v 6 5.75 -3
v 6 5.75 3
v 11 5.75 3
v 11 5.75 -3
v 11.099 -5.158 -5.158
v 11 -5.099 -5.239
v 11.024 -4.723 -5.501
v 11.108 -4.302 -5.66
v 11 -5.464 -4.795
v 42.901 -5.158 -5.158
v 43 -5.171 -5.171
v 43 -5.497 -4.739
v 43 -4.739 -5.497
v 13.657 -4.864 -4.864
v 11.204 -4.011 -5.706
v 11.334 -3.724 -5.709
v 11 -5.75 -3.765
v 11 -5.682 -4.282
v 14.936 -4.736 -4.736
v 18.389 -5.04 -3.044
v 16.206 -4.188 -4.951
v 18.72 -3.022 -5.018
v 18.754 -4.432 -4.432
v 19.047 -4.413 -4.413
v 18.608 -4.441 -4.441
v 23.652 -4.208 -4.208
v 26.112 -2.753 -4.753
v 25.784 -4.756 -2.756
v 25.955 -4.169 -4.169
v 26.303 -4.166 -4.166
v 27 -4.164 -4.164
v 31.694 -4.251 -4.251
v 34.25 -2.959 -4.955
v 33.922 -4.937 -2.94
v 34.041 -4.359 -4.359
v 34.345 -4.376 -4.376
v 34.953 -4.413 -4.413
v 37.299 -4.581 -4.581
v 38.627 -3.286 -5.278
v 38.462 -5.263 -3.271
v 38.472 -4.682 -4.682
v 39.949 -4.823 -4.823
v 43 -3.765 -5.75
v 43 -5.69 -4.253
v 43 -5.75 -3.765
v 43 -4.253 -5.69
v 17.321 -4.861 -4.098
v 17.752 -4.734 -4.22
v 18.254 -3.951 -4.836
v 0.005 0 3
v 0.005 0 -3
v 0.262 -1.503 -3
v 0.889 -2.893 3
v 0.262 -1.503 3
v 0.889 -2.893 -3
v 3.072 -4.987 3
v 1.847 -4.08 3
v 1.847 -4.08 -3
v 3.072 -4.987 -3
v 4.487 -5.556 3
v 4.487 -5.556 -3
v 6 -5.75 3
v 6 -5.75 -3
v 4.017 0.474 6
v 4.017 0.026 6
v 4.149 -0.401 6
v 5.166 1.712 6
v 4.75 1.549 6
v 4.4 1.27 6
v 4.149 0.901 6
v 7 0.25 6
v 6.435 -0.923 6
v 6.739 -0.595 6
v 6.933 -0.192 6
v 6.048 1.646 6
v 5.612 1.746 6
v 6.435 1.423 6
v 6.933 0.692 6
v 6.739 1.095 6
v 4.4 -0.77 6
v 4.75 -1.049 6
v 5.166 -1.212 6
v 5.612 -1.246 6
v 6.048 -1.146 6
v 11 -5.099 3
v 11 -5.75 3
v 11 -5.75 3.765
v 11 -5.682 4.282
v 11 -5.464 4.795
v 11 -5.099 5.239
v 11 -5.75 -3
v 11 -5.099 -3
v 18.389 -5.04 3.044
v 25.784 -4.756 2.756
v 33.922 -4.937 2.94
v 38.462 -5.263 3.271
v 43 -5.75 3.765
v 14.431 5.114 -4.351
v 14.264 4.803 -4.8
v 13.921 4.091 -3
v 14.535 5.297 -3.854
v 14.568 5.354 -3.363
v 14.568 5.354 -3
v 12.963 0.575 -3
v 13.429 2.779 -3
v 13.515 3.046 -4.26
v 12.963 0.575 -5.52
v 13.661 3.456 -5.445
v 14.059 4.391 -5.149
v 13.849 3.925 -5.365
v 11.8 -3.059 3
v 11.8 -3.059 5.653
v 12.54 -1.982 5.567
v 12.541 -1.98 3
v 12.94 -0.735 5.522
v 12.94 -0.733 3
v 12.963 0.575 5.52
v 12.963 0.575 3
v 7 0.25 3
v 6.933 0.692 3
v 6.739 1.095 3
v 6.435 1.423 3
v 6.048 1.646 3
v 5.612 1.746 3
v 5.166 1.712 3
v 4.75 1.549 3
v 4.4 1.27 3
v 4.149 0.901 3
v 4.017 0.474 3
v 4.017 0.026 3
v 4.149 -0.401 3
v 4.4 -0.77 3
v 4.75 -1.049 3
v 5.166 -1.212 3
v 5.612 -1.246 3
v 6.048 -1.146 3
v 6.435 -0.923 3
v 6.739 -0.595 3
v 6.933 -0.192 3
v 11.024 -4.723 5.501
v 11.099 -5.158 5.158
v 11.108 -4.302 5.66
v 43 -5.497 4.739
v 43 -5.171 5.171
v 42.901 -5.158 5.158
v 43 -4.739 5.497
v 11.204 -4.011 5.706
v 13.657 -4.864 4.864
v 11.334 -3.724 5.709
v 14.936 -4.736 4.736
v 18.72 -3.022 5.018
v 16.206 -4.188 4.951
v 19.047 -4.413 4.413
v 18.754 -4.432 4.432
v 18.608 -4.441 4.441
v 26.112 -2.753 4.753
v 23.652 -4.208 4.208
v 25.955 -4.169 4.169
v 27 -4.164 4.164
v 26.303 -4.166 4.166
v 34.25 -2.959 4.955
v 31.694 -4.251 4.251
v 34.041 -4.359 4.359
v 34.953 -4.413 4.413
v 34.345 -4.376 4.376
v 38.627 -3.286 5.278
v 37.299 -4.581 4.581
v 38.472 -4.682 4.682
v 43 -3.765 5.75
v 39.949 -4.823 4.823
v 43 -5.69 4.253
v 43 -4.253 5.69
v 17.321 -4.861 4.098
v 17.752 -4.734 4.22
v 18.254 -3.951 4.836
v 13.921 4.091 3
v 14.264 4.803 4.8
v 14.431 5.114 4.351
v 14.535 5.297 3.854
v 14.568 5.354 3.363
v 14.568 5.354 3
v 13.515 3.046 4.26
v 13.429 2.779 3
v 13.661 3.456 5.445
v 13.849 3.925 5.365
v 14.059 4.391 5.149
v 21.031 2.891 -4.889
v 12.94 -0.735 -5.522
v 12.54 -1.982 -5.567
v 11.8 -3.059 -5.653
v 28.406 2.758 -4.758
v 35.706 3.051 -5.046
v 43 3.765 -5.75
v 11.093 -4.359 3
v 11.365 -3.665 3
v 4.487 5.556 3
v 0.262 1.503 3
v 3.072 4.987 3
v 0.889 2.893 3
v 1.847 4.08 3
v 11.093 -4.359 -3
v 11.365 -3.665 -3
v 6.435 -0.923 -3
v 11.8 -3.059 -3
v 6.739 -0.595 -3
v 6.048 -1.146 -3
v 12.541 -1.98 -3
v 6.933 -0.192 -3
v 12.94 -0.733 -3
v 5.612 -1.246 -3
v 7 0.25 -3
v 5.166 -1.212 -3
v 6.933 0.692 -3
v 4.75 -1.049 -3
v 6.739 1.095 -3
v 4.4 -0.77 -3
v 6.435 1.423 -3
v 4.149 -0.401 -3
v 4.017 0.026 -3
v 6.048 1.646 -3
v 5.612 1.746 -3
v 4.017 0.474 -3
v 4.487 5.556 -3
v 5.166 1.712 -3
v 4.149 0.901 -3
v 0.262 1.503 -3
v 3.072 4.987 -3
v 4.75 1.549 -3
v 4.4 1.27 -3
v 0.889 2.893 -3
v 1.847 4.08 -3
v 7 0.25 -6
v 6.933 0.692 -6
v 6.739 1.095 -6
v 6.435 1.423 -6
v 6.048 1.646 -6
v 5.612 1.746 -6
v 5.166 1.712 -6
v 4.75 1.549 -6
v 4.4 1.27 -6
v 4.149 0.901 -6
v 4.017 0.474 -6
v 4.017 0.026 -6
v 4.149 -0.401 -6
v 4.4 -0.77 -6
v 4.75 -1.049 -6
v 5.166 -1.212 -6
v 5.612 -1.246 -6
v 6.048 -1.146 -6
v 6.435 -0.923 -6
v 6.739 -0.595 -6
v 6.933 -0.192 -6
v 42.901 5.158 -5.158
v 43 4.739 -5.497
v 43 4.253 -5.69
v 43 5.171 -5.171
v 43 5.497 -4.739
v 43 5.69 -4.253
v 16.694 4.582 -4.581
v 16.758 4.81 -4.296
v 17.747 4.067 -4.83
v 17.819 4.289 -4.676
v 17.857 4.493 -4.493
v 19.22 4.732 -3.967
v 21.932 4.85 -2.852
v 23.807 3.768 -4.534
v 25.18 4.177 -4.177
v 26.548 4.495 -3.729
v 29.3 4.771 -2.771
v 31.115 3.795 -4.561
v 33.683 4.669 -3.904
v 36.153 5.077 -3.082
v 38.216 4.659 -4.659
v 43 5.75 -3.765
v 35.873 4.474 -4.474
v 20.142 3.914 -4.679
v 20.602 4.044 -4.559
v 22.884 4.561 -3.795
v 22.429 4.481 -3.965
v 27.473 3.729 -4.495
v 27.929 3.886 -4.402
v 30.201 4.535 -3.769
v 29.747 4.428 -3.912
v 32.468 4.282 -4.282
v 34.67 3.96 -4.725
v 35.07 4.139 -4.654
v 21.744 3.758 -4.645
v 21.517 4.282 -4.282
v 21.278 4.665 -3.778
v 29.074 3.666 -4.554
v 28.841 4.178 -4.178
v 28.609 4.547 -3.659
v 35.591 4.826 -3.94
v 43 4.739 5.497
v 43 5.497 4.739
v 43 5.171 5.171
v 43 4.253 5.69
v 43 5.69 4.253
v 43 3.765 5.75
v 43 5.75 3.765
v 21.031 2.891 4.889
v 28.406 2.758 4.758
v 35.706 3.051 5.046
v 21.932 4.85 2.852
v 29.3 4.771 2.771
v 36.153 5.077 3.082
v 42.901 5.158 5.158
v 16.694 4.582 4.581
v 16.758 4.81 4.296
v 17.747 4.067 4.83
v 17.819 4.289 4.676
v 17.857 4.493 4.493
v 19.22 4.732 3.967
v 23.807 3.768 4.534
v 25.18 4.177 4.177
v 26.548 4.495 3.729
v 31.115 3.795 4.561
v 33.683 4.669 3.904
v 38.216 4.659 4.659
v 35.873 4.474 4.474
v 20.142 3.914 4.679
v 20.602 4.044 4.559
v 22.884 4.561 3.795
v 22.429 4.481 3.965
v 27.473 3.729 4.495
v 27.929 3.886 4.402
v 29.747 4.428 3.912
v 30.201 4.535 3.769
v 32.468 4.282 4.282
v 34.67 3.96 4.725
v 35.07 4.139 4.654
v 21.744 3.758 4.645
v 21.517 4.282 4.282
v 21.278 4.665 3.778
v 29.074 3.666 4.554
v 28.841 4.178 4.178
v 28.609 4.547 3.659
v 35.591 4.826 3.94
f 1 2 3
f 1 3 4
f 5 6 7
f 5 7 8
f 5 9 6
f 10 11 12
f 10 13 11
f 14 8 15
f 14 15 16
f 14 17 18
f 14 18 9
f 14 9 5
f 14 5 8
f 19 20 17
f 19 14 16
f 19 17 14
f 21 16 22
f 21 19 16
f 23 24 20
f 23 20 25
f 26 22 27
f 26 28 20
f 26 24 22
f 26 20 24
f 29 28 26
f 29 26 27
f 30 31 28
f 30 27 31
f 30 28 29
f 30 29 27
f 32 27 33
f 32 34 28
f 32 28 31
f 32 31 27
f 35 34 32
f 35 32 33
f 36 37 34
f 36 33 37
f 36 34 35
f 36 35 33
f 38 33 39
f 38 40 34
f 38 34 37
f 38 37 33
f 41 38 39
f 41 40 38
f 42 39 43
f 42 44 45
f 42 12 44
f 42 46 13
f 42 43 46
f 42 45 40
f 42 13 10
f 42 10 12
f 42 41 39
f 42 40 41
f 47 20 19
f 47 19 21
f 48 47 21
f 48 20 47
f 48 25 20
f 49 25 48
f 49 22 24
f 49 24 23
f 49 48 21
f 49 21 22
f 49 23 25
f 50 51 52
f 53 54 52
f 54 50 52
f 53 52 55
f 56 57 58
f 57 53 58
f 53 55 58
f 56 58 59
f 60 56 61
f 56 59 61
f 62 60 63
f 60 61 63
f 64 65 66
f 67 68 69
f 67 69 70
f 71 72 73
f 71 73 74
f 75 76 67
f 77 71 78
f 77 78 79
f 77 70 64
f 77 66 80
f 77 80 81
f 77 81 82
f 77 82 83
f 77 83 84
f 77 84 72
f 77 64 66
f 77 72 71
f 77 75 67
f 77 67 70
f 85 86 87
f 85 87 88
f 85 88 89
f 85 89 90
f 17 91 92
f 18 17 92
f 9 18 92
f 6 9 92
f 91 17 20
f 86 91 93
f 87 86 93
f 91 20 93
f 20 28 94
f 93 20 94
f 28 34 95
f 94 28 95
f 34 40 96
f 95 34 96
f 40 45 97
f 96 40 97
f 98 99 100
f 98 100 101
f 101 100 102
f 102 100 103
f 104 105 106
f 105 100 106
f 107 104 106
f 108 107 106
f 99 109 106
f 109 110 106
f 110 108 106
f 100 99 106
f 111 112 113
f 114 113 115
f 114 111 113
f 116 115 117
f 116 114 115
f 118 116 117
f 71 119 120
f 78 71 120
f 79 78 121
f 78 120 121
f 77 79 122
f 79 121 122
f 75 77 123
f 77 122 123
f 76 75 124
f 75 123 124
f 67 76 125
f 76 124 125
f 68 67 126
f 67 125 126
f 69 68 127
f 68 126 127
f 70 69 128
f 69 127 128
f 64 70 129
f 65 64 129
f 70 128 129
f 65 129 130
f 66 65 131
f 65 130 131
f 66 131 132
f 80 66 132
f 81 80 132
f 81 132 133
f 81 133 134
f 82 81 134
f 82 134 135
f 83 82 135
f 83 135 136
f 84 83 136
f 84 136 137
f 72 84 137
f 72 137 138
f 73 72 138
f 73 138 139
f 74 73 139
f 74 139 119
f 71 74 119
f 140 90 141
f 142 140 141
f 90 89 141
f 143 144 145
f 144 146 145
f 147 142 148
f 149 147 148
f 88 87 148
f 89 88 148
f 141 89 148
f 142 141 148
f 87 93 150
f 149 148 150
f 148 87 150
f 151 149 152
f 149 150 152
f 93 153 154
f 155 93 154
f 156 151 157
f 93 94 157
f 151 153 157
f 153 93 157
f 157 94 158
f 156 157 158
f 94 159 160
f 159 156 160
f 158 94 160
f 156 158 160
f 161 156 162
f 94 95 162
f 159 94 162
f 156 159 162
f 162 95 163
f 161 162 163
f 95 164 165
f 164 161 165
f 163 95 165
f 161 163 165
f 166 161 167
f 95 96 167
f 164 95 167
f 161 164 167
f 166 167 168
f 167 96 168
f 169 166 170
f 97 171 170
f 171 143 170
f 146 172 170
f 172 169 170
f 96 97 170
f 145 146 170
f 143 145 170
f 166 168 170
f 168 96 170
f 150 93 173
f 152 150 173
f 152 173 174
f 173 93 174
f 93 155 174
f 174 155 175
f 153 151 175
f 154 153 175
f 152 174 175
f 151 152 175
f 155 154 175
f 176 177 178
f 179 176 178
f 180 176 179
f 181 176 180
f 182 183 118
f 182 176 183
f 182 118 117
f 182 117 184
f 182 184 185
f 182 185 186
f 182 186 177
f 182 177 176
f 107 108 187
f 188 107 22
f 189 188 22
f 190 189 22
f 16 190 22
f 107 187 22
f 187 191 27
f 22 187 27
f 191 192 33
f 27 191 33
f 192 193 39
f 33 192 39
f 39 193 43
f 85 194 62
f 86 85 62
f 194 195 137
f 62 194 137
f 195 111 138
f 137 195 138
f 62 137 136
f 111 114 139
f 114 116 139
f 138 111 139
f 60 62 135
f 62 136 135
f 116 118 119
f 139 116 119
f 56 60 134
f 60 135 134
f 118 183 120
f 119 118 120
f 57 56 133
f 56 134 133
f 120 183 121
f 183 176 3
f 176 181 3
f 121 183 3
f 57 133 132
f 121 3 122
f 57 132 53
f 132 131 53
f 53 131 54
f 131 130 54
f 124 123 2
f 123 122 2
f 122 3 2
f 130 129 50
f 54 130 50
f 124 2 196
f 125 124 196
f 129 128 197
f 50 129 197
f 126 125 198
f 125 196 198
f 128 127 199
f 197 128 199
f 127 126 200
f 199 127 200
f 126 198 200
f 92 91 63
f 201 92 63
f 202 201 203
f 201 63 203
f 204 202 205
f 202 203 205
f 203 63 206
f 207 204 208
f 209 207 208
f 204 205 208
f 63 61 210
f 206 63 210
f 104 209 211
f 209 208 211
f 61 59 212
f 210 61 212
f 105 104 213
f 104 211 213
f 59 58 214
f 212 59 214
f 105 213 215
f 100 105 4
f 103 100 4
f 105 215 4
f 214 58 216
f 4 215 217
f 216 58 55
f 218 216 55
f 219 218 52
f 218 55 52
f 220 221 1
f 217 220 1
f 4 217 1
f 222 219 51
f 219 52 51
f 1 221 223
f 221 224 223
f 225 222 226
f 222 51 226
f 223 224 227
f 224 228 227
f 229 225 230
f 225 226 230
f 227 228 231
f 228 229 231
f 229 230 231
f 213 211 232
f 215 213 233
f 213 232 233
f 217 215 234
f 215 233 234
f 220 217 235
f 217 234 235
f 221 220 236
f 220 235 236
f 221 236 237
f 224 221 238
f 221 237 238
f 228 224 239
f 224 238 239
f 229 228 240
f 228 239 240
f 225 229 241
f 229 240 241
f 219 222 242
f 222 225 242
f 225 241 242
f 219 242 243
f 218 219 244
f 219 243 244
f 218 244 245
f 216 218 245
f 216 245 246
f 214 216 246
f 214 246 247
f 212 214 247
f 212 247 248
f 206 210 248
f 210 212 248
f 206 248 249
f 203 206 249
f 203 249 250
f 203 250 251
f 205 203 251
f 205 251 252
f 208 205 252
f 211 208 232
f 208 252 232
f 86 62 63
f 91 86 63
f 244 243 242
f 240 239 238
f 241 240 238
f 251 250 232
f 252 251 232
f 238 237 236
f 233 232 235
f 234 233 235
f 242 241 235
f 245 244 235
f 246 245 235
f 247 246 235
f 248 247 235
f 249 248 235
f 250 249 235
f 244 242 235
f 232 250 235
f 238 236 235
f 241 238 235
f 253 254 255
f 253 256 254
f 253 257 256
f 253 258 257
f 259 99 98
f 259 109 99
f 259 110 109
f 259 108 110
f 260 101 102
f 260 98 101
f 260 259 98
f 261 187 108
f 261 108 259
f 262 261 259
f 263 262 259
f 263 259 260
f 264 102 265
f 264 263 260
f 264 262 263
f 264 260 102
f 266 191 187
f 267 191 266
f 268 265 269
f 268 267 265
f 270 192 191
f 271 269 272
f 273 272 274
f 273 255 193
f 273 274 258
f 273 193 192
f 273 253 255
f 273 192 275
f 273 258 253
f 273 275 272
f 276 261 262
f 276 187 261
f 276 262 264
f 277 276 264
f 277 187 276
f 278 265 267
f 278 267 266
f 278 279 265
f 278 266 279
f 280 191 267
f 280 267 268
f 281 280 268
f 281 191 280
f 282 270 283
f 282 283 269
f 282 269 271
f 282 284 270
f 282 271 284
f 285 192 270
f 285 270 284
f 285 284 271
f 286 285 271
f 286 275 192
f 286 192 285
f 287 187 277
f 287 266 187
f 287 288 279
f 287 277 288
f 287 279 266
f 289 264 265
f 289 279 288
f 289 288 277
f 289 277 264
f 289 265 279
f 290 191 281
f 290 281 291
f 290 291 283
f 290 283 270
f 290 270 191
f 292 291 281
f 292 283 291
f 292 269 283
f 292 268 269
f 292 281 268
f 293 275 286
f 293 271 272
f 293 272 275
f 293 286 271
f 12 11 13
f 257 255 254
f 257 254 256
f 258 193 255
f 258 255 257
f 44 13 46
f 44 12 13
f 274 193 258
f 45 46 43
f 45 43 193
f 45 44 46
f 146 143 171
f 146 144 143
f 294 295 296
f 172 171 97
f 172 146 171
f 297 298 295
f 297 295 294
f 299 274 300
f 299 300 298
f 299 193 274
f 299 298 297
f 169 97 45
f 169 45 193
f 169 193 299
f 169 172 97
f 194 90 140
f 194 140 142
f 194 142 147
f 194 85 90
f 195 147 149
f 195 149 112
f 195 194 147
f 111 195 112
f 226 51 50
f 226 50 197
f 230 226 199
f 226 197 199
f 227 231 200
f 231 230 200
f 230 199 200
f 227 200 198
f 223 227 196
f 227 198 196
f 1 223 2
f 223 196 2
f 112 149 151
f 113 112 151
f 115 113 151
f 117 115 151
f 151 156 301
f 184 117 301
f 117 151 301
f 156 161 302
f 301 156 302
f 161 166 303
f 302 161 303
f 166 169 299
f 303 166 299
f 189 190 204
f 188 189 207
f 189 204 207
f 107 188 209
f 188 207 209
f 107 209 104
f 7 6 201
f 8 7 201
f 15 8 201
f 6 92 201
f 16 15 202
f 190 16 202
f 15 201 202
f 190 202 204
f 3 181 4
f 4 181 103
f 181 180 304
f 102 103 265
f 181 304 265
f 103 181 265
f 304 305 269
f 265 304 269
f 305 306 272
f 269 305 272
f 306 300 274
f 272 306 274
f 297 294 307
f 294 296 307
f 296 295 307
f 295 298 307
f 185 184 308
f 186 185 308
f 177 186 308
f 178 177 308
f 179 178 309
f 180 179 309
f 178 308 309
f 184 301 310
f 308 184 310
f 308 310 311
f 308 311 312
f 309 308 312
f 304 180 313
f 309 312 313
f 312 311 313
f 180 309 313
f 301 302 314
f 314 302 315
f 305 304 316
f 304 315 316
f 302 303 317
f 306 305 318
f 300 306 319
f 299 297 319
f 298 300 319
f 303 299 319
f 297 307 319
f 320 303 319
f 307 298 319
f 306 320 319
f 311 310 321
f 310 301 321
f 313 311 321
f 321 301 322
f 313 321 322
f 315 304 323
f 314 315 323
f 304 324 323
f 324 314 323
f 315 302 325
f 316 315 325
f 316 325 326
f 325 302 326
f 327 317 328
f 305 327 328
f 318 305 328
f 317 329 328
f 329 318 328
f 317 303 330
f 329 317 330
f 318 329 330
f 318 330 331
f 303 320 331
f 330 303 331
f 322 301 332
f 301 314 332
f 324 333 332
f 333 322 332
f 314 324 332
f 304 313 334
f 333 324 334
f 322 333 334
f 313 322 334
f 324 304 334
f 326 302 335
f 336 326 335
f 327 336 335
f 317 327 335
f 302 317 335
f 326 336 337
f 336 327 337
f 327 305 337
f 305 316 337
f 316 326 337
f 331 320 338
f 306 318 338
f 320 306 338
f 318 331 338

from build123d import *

# Parameters (mm, degrees)
SKETCH1_W                = 6
SKETCH1_H                = 11.5
BOSS_EXTRUDE1_DEPTH      = 11
BOSS_EXTRUDE2_DEPTH      = 3
BOSS_EXTRUDE2_DEPTH_BACK = 9
SKETCH2_R                = 1.5
FILLET2_R                = 2
CUT_EXTRUDE4_DEPTH       = 3
FILLET8_R                = 3
CUT_EXTRUDE7_DEPTH       = 45.306461264
FILLET9_R                = 6


with BuildPart() as part:
    # Sketch1 → Boss-Extrude1 (new body)
    with BuildSketch(Plane(origin=(0, 0, 0), x_dir=(0, 0, -1), z_dir=(1, 0, 0))):
        Rectangle(SKETCH1_W, SKETCH1_H)
    extrude(amount=BOSS_EXTRUDE1_DEPTH)

    # Sketch2 → Boss-Extrude2 (add, two sides: drawn at the far end of the back side and taken through both)
    with BuildSketch(Plane.XY.offset(3).offset(-BOSS_EXTRUDE2_DEPTH_BACK)):
        with Locations((5.5, 0.25)):
            Circle(SKETCH2_R)
    extrude(amount=BOSS_EXTRUDE2_DEPTH + BOSS_EXTRUDE2_DEPTH_BACK)

    # Sketch3 → Loft1 section 0
    with BuildSketch(Plane(origin=(11, 0, 0), x_dir=(0, 0, -1), z_dir=(1, 0, 0))):
        with BuildLine():
            Line((5.75, -5.75), (-5.75, -5.75))
            Line((-5.75, -5.75), (-5.75, 5.75))
            Line((-5.75, 5.75), (5.75, 5.75))
            Line((5.75, 5.75), (5.75, -5.75))
        make_face()
    # Sketch4 → Loft1 section 1
    with BuildSketch(Plane(origin=(27, 0, 0), x_dir=(0, 0, -1), z_dir=(1, 0, 0))):
        with BuildLine():
            Line((4.75, -4.75), (-4.75, -4.75))
            Line((-4.75, -4.75), (-4.75, 4.75))
            Line((-4.75, 4.75), (4.75, 4.75))
            Line((4.75, 4.75), (4.75, -4.75))
        make_face()
    # Sketch5 → Loft1 section 2
    with BuildSketch(Plane(origin=(43, 0, 0), x_dir=(0, 0, -1), z_dir=(1, 0, 0))):
        with BuildLine():
            Line((5.75, -5.75), (-5.75, -5.75))
            Line((-5.75, -5.75), (-5.75, 5.75))
            Line((-5.75, 5.75), (5.75, 5.75))
            Line((5.75, 5.75), (5.75, -5.75))
        make_face()
    loft()

    # Fillet2
    fillet2_edges = [part.edges().sort_by_distance(p)[0] for p in [
        (27, 4.75, -4.75),
        (27, -4.75, -4.75),
        (27, -4.75, 4.75),
        (27, 4.75, 4.75),
    ]]
    fillet(fillet2_edges, radius=FILLET2_R)

    # Sketch11 → Cut-Extrude4 (cut)
    with BuildSketch(Plane(origin=(0, 0, -3), x_dir=(-1, 0, 0), z_dir=(0, 0, -1))):
        with BuildLine():
            Line((-8.5, 4.5), (-8.5, -4.5))
            ThreePointArc((-8.5, -4.5), (-13, 0), (-8.5, 4.5))
        make_face()
    cut_extrude4 = extrude(amount=CUT_EXTRUDE4_DEPTH, mode=Mode.SUBTRACT)

    # Mirror2: Cut-Extrude4 across plane
    add(cut_extrude4.mirror(Plane.XY), mode=Mode.SUBTRACT)

    # Fillet8
    fillet8_edges = [part.edges().sort_by_distance(p)[0] for p in [
        (11, 3.741657387, 4.375),
        (11, -3.741657387, 4.375),
        (11, 3.741657387, -4.375),
        (11, -3.741657387, -4.375),
    ]]
    fillet(fillet8_edges, radius=FILLET8_R)

    # Sketch14 → Cut-Extrude7 (cut, through all)
    with BuildSketch(Plane(origin=(0, 0, -3), x_dir=(-1, 0, 0), z_dir=(0, 0, -1))):
        with BuildLine():
            Line((-8.853025193, 6.183254842), (-15.095603268, 6.183254842))
            add(Edge.make_bspline(
                [(-12.96305568, 0.575442436), (-13.32215255, 3.608062735), (-15.095603268, 6.183254842)],
                knots=[0, 0, 0, 1, 1, 1], degree=2))
            Line((-12.96305568, 0.575442436), (-8.853025193, 6.183254842))
        make_face()
    cut_extrude7 = extrude(amount=CUT_EXTRUDE7_DEPTH, mode=Mode.SUBTRACT)

    # Mirror3: Cut-Extrude7 across plane
    add(cut_extrude7.mirror(Plane.XY), mode=Mode.SUBTRACT)

    # Fillet9
    # the kernel refuses this fillet: 6 mm, written as the material it takes off along each edge
    with BuildSketch(Plane(origin=(0, 5.75, 18), x_dir=(0, -1, 0), z_dir=(0, 0, -1))) as fillet9_piece_1:
        with BuildLine():
            CenterArc((FILLET9_R, -FILLET9_R), FILLET9_R, 90, 90)
            Line((0, -FILLET9_R), (0, 0))
            Line((0, 0), (FILLET9_R, 0))
        make_face()
    extrude(amount=36, mode=Mode.SUBTRACT)
    with BuildSketch(Plane(origin=(0, -5.75, -18), x_dir=(1, 0, 0), z_dir=(0, 0, 1))) as fillet9_piece_2:
        with BuildLine():
            CenterArc((FILLET9_R, FILLET9_R), FILLET9_R, 180, 90)
            Line((0, FILLET9_R), (0, 0))
            Line((0, 0), (FILLET9_R, 0))
        make_face()
    extrude(amount=36, mode=Mode.SUBTRACT)


solid = part.part
